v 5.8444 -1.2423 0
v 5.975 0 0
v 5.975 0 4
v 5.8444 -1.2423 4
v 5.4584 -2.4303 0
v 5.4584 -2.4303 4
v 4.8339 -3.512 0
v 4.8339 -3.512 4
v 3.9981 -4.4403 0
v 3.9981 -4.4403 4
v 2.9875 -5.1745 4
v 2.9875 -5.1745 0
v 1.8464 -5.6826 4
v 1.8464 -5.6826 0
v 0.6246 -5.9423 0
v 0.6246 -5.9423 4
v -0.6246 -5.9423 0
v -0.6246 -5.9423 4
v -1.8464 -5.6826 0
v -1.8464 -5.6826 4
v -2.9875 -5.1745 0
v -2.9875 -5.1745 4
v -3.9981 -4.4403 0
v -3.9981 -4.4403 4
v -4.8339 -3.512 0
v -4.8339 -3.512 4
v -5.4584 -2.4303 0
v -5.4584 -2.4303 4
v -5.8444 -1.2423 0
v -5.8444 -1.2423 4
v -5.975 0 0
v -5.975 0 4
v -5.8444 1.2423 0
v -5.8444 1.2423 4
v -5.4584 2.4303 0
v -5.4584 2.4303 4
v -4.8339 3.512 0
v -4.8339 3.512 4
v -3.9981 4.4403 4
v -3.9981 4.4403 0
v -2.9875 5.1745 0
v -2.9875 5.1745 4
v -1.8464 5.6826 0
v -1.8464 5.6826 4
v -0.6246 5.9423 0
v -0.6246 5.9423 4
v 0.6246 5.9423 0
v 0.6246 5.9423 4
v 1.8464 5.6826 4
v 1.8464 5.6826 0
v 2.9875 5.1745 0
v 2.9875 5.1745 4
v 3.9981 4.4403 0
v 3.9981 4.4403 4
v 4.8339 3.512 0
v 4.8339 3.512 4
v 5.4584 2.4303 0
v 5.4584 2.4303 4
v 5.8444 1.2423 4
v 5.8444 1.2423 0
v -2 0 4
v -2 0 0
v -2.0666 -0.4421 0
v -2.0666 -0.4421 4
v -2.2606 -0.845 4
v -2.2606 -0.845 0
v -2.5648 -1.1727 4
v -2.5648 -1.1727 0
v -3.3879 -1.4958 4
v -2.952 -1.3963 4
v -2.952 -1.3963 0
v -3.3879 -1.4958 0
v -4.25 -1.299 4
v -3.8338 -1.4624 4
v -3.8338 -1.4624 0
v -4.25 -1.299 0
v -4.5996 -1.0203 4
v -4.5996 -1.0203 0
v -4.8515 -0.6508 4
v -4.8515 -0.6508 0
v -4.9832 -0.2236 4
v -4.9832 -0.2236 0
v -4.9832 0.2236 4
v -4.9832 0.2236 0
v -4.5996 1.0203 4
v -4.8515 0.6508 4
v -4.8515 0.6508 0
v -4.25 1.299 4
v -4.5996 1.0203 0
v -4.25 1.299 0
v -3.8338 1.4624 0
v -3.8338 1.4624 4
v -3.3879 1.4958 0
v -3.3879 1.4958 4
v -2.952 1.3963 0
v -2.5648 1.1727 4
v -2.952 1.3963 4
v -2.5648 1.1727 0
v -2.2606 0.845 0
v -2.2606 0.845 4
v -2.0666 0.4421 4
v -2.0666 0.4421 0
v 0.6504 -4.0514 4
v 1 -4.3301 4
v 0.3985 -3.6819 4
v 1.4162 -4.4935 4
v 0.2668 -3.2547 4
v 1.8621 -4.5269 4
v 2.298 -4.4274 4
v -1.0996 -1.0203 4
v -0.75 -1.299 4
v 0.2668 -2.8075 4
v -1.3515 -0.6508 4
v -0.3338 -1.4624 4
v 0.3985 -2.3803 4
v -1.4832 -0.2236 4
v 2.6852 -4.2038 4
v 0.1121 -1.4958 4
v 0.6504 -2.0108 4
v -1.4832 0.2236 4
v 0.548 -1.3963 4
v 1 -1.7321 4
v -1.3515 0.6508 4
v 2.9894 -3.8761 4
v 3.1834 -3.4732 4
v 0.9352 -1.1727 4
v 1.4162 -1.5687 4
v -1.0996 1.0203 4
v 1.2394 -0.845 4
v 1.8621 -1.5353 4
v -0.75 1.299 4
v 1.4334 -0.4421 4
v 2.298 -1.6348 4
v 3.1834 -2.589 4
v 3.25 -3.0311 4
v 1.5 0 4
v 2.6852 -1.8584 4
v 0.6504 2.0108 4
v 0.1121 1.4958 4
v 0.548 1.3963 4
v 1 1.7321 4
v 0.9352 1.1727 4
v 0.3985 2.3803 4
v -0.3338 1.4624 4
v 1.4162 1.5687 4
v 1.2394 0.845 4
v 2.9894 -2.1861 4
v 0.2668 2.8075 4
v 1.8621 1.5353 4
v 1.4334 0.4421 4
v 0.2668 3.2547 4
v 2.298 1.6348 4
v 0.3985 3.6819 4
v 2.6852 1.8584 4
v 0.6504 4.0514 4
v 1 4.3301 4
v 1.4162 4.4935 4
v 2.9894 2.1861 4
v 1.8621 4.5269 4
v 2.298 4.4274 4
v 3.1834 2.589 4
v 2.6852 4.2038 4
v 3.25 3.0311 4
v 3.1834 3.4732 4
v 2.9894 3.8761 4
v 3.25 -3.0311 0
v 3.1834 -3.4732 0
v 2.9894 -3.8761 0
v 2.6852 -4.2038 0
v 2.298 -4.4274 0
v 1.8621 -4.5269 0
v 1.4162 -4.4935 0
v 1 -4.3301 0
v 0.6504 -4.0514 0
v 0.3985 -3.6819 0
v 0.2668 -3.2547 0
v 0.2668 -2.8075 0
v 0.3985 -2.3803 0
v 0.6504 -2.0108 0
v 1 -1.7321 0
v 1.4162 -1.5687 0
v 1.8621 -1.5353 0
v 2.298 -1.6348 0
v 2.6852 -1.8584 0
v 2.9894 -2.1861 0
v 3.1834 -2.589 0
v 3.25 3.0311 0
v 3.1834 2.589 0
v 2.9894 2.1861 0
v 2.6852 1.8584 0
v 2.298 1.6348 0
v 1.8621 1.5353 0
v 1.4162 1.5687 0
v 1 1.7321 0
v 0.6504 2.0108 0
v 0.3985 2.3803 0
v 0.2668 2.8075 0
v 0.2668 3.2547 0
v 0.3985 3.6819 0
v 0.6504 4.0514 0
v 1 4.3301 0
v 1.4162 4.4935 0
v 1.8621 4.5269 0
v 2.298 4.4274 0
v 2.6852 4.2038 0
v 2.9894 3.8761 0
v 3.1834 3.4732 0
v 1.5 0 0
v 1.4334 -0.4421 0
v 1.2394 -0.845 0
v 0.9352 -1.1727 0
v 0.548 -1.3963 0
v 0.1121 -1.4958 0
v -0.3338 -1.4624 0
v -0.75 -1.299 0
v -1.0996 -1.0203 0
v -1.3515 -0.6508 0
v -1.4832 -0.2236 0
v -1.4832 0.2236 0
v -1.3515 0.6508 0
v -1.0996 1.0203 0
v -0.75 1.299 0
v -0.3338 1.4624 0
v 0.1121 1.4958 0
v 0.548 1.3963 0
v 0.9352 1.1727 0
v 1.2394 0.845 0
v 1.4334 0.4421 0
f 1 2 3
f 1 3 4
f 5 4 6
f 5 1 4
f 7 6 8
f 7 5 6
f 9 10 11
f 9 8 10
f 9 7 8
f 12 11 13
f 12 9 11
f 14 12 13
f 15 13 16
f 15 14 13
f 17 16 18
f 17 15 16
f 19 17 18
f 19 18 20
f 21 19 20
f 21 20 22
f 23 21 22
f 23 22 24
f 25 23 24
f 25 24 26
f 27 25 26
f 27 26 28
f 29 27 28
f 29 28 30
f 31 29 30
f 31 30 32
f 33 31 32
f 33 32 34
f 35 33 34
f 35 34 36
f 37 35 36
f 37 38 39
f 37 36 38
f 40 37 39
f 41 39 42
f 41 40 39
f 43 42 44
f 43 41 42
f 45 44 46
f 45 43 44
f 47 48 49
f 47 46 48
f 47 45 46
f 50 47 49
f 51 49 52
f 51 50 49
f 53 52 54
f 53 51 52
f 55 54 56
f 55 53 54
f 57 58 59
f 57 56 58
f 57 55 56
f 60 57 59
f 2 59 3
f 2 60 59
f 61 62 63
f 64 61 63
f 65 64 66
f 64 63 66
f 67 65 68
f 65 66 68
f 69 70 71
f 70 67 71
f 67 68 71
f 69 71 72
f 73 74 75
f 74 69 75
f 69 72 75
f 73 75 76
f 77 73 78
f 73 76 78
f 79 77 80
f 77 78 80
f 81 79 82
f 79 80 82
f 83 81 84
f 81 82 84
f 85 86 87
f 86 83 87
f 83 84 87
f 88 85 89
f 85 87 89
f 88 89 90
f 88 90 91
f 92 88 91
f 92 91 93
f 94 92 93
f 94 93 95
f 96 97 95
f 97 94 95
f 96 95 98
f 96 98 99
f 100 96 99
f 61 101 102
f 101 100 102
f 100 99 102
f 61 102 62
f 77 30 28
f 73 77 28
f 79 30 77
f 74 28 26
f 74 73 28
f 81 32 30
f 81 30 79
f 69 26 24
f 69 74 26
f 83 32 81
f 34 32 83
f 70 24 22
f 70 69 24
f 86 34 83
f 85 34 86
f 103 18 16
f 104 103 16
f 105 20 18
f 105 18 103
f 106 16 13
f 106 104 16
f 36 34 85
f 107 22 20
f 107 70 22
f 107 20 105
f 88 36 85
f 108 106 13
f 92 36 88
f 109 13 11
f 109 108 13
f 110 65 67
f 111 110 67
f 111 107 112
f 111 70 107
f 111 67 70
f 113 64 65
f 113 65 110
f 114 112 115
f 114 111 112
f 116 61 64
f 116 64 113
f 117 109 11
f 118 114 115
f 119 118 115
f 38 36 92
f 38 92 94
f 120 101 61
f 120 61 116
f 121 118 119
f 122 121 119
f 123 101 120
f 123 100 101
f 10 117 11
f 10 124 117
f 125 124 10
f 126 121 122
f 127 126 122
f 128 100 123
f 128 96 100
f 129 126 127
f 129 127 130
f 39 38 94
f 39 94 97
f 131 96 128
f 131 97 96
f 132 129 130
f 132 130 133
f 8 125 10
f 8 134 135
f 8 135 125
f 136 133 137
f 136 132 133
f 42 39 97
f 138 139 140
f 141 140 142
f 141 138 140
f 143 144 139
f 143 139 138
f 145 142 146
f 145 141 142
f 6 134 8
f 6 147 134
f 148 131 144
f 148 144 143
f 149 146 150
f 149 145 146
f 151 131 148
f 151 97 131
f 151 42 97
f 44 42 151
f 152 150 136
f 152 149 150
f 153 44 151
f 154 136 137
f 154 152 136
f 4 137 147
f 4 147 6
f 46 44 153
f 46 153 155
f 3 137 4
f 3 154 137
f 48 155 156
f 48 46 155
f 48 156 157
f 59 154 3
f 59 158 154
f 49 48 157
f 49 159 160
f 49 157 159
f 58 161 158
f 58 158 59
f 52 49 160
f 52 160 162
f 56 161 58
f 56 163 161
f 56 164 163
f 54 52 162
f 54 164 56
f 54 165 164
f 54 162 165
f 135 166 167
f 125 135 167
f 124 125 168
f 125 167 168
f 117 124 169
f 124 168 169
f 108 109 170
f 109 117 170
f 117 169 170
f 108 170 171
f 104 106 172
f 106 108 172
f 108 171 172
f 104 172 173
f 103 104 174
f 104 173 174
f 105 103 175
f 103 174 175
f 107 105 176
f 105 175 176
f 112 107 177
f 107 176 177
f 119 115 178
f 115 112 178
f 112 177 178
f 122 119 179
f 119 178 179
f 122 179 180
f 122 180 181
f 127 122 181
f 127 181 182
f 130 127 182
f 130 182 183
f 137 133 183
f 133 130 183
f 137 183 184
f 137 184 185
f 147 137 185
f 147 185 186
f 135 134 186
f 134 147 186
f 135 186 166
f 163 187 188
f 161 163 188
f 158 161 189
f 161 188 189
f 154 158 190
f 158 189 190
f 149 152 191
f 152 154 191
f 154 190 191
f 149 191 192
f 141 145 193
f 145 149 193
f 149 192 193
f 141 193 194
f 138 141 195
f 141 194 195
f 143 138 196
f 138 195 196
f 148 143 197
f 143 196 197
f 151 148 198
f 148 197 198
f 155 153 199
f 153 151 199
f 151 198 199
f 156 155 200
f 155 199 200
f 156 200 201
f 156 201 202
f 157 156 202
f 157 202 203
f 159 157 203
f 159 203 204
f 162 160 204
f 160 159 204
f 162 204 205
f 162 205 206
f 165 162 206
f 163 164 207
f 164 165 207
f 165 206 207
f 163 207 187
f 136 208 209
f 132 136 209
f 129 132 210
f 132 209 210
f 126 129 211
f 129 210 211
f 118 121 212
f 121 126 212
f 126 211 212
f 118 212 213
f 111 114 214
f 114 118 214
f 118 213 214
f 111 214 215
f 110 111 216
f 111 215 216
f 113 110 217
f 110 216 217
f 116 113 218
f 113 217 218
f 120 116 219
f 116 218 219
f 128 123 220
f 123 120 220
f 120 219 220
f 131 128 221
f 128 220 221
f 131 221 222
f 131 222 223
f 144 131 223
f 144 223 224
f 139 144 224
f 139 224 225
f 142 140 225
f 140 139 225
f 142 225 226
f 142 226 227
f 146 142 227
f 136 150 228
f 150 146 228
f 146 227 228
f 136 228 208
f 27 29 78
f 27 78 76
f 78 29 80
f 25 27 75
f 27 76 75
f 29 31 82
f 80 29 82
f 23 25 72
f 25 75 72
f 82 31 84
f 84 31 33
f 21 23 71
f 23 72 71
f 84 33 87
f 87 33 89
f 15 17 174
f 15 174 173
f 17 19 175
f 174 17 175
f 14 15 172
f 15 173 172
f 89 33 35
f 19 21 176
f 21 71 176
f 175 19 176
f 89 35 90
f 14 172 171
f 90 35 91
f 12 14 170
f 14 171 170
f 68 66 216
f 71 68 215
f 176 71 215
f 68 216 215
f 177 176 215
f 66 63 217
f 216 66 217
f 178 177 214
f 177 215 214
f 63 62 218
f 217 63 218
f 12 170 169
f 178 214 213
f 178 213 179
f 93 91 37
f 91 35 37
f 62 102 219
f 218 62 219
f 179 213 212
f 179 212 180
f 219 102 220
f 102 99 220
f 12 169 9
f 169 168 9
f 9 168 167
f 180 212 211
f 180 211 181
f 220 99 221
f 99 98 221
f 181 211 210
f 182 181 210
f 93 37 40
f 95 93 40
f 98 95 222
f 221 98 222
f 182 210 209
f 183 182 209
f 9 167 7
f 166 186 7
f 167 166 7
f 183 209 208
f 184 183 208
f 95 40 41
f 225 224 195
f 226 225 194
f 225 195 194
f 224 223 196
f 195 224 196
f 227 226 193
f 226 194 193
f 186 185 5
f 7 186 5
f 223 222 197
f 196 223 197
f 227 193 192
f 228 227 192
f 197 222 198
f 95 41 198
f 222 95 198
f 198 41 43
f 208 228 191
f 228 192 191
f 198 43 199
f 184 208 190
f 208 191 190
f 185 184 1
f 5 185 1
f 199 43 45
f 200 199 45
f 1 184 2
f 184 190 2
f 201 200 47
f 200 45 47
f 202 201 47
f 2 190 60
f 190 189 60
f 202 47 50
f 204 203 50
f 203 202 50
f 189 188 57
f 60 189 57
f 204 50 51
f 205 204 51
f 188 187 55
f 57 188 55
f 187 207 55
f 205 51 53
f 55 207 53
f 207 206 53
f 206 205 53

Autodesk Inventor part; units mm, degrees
ref_plane "YZ Plane" through (0, 0, 0) normal (1, 0, 0) x (0, 1, 0)
ref_plane "XZ Plane" through (0, 0, 0) normal (0, 1, 0) x (-1, 0, 0)
ref_plane "XY Plane" through (0, 0, 0) normal (0, 0, 1) x (1, 0, 0)
sketch "スケッチ1" plane through (0, 0, 0) normal (0, 0, 1) x (1, 0, 0)
  circle A0 centre (0, 0) radius 1.5
  circle A1 centre (1.75, 3.0311) radius 1.5
  circle A2 centre (-3.5, 0) radius 1.5
  circle A3 centre (1.75, -3.0311) radius 1.5
  circle A4 centre (0, 0) radius 5.975
  circle A5 centre (0, 0) radius 1.25 construction
  line L0 (-3.5, 0) -> (1.75, 3.0311) construction
  line L1 (1.75, 3.0311) -> (1.75, -3.0311) construction
  line L2 (1.75, -3.0311) -> (-3.5, 0) construction
  line L3 (0, 0) -> (3.1471, 0) construction
  circle A6 centre (0, 0) radius 3.5 construction
  dimension "d0" = 11.95
  dimension "d1" = 3
  dimension "d2" = 3
  dimension "d3" = 3.5
extrude "押し出し1" add sketch "スケッチ1" along normal blind 4
equation "\"d1\" = d2"
equation "\"d3\" = d5"
equation "\"d5\" = d6"
equation "\"d6\" = 3.5"
properties part number "原動節-ヘッケン接続部v2" material "アルミニウム 2014-T4"
